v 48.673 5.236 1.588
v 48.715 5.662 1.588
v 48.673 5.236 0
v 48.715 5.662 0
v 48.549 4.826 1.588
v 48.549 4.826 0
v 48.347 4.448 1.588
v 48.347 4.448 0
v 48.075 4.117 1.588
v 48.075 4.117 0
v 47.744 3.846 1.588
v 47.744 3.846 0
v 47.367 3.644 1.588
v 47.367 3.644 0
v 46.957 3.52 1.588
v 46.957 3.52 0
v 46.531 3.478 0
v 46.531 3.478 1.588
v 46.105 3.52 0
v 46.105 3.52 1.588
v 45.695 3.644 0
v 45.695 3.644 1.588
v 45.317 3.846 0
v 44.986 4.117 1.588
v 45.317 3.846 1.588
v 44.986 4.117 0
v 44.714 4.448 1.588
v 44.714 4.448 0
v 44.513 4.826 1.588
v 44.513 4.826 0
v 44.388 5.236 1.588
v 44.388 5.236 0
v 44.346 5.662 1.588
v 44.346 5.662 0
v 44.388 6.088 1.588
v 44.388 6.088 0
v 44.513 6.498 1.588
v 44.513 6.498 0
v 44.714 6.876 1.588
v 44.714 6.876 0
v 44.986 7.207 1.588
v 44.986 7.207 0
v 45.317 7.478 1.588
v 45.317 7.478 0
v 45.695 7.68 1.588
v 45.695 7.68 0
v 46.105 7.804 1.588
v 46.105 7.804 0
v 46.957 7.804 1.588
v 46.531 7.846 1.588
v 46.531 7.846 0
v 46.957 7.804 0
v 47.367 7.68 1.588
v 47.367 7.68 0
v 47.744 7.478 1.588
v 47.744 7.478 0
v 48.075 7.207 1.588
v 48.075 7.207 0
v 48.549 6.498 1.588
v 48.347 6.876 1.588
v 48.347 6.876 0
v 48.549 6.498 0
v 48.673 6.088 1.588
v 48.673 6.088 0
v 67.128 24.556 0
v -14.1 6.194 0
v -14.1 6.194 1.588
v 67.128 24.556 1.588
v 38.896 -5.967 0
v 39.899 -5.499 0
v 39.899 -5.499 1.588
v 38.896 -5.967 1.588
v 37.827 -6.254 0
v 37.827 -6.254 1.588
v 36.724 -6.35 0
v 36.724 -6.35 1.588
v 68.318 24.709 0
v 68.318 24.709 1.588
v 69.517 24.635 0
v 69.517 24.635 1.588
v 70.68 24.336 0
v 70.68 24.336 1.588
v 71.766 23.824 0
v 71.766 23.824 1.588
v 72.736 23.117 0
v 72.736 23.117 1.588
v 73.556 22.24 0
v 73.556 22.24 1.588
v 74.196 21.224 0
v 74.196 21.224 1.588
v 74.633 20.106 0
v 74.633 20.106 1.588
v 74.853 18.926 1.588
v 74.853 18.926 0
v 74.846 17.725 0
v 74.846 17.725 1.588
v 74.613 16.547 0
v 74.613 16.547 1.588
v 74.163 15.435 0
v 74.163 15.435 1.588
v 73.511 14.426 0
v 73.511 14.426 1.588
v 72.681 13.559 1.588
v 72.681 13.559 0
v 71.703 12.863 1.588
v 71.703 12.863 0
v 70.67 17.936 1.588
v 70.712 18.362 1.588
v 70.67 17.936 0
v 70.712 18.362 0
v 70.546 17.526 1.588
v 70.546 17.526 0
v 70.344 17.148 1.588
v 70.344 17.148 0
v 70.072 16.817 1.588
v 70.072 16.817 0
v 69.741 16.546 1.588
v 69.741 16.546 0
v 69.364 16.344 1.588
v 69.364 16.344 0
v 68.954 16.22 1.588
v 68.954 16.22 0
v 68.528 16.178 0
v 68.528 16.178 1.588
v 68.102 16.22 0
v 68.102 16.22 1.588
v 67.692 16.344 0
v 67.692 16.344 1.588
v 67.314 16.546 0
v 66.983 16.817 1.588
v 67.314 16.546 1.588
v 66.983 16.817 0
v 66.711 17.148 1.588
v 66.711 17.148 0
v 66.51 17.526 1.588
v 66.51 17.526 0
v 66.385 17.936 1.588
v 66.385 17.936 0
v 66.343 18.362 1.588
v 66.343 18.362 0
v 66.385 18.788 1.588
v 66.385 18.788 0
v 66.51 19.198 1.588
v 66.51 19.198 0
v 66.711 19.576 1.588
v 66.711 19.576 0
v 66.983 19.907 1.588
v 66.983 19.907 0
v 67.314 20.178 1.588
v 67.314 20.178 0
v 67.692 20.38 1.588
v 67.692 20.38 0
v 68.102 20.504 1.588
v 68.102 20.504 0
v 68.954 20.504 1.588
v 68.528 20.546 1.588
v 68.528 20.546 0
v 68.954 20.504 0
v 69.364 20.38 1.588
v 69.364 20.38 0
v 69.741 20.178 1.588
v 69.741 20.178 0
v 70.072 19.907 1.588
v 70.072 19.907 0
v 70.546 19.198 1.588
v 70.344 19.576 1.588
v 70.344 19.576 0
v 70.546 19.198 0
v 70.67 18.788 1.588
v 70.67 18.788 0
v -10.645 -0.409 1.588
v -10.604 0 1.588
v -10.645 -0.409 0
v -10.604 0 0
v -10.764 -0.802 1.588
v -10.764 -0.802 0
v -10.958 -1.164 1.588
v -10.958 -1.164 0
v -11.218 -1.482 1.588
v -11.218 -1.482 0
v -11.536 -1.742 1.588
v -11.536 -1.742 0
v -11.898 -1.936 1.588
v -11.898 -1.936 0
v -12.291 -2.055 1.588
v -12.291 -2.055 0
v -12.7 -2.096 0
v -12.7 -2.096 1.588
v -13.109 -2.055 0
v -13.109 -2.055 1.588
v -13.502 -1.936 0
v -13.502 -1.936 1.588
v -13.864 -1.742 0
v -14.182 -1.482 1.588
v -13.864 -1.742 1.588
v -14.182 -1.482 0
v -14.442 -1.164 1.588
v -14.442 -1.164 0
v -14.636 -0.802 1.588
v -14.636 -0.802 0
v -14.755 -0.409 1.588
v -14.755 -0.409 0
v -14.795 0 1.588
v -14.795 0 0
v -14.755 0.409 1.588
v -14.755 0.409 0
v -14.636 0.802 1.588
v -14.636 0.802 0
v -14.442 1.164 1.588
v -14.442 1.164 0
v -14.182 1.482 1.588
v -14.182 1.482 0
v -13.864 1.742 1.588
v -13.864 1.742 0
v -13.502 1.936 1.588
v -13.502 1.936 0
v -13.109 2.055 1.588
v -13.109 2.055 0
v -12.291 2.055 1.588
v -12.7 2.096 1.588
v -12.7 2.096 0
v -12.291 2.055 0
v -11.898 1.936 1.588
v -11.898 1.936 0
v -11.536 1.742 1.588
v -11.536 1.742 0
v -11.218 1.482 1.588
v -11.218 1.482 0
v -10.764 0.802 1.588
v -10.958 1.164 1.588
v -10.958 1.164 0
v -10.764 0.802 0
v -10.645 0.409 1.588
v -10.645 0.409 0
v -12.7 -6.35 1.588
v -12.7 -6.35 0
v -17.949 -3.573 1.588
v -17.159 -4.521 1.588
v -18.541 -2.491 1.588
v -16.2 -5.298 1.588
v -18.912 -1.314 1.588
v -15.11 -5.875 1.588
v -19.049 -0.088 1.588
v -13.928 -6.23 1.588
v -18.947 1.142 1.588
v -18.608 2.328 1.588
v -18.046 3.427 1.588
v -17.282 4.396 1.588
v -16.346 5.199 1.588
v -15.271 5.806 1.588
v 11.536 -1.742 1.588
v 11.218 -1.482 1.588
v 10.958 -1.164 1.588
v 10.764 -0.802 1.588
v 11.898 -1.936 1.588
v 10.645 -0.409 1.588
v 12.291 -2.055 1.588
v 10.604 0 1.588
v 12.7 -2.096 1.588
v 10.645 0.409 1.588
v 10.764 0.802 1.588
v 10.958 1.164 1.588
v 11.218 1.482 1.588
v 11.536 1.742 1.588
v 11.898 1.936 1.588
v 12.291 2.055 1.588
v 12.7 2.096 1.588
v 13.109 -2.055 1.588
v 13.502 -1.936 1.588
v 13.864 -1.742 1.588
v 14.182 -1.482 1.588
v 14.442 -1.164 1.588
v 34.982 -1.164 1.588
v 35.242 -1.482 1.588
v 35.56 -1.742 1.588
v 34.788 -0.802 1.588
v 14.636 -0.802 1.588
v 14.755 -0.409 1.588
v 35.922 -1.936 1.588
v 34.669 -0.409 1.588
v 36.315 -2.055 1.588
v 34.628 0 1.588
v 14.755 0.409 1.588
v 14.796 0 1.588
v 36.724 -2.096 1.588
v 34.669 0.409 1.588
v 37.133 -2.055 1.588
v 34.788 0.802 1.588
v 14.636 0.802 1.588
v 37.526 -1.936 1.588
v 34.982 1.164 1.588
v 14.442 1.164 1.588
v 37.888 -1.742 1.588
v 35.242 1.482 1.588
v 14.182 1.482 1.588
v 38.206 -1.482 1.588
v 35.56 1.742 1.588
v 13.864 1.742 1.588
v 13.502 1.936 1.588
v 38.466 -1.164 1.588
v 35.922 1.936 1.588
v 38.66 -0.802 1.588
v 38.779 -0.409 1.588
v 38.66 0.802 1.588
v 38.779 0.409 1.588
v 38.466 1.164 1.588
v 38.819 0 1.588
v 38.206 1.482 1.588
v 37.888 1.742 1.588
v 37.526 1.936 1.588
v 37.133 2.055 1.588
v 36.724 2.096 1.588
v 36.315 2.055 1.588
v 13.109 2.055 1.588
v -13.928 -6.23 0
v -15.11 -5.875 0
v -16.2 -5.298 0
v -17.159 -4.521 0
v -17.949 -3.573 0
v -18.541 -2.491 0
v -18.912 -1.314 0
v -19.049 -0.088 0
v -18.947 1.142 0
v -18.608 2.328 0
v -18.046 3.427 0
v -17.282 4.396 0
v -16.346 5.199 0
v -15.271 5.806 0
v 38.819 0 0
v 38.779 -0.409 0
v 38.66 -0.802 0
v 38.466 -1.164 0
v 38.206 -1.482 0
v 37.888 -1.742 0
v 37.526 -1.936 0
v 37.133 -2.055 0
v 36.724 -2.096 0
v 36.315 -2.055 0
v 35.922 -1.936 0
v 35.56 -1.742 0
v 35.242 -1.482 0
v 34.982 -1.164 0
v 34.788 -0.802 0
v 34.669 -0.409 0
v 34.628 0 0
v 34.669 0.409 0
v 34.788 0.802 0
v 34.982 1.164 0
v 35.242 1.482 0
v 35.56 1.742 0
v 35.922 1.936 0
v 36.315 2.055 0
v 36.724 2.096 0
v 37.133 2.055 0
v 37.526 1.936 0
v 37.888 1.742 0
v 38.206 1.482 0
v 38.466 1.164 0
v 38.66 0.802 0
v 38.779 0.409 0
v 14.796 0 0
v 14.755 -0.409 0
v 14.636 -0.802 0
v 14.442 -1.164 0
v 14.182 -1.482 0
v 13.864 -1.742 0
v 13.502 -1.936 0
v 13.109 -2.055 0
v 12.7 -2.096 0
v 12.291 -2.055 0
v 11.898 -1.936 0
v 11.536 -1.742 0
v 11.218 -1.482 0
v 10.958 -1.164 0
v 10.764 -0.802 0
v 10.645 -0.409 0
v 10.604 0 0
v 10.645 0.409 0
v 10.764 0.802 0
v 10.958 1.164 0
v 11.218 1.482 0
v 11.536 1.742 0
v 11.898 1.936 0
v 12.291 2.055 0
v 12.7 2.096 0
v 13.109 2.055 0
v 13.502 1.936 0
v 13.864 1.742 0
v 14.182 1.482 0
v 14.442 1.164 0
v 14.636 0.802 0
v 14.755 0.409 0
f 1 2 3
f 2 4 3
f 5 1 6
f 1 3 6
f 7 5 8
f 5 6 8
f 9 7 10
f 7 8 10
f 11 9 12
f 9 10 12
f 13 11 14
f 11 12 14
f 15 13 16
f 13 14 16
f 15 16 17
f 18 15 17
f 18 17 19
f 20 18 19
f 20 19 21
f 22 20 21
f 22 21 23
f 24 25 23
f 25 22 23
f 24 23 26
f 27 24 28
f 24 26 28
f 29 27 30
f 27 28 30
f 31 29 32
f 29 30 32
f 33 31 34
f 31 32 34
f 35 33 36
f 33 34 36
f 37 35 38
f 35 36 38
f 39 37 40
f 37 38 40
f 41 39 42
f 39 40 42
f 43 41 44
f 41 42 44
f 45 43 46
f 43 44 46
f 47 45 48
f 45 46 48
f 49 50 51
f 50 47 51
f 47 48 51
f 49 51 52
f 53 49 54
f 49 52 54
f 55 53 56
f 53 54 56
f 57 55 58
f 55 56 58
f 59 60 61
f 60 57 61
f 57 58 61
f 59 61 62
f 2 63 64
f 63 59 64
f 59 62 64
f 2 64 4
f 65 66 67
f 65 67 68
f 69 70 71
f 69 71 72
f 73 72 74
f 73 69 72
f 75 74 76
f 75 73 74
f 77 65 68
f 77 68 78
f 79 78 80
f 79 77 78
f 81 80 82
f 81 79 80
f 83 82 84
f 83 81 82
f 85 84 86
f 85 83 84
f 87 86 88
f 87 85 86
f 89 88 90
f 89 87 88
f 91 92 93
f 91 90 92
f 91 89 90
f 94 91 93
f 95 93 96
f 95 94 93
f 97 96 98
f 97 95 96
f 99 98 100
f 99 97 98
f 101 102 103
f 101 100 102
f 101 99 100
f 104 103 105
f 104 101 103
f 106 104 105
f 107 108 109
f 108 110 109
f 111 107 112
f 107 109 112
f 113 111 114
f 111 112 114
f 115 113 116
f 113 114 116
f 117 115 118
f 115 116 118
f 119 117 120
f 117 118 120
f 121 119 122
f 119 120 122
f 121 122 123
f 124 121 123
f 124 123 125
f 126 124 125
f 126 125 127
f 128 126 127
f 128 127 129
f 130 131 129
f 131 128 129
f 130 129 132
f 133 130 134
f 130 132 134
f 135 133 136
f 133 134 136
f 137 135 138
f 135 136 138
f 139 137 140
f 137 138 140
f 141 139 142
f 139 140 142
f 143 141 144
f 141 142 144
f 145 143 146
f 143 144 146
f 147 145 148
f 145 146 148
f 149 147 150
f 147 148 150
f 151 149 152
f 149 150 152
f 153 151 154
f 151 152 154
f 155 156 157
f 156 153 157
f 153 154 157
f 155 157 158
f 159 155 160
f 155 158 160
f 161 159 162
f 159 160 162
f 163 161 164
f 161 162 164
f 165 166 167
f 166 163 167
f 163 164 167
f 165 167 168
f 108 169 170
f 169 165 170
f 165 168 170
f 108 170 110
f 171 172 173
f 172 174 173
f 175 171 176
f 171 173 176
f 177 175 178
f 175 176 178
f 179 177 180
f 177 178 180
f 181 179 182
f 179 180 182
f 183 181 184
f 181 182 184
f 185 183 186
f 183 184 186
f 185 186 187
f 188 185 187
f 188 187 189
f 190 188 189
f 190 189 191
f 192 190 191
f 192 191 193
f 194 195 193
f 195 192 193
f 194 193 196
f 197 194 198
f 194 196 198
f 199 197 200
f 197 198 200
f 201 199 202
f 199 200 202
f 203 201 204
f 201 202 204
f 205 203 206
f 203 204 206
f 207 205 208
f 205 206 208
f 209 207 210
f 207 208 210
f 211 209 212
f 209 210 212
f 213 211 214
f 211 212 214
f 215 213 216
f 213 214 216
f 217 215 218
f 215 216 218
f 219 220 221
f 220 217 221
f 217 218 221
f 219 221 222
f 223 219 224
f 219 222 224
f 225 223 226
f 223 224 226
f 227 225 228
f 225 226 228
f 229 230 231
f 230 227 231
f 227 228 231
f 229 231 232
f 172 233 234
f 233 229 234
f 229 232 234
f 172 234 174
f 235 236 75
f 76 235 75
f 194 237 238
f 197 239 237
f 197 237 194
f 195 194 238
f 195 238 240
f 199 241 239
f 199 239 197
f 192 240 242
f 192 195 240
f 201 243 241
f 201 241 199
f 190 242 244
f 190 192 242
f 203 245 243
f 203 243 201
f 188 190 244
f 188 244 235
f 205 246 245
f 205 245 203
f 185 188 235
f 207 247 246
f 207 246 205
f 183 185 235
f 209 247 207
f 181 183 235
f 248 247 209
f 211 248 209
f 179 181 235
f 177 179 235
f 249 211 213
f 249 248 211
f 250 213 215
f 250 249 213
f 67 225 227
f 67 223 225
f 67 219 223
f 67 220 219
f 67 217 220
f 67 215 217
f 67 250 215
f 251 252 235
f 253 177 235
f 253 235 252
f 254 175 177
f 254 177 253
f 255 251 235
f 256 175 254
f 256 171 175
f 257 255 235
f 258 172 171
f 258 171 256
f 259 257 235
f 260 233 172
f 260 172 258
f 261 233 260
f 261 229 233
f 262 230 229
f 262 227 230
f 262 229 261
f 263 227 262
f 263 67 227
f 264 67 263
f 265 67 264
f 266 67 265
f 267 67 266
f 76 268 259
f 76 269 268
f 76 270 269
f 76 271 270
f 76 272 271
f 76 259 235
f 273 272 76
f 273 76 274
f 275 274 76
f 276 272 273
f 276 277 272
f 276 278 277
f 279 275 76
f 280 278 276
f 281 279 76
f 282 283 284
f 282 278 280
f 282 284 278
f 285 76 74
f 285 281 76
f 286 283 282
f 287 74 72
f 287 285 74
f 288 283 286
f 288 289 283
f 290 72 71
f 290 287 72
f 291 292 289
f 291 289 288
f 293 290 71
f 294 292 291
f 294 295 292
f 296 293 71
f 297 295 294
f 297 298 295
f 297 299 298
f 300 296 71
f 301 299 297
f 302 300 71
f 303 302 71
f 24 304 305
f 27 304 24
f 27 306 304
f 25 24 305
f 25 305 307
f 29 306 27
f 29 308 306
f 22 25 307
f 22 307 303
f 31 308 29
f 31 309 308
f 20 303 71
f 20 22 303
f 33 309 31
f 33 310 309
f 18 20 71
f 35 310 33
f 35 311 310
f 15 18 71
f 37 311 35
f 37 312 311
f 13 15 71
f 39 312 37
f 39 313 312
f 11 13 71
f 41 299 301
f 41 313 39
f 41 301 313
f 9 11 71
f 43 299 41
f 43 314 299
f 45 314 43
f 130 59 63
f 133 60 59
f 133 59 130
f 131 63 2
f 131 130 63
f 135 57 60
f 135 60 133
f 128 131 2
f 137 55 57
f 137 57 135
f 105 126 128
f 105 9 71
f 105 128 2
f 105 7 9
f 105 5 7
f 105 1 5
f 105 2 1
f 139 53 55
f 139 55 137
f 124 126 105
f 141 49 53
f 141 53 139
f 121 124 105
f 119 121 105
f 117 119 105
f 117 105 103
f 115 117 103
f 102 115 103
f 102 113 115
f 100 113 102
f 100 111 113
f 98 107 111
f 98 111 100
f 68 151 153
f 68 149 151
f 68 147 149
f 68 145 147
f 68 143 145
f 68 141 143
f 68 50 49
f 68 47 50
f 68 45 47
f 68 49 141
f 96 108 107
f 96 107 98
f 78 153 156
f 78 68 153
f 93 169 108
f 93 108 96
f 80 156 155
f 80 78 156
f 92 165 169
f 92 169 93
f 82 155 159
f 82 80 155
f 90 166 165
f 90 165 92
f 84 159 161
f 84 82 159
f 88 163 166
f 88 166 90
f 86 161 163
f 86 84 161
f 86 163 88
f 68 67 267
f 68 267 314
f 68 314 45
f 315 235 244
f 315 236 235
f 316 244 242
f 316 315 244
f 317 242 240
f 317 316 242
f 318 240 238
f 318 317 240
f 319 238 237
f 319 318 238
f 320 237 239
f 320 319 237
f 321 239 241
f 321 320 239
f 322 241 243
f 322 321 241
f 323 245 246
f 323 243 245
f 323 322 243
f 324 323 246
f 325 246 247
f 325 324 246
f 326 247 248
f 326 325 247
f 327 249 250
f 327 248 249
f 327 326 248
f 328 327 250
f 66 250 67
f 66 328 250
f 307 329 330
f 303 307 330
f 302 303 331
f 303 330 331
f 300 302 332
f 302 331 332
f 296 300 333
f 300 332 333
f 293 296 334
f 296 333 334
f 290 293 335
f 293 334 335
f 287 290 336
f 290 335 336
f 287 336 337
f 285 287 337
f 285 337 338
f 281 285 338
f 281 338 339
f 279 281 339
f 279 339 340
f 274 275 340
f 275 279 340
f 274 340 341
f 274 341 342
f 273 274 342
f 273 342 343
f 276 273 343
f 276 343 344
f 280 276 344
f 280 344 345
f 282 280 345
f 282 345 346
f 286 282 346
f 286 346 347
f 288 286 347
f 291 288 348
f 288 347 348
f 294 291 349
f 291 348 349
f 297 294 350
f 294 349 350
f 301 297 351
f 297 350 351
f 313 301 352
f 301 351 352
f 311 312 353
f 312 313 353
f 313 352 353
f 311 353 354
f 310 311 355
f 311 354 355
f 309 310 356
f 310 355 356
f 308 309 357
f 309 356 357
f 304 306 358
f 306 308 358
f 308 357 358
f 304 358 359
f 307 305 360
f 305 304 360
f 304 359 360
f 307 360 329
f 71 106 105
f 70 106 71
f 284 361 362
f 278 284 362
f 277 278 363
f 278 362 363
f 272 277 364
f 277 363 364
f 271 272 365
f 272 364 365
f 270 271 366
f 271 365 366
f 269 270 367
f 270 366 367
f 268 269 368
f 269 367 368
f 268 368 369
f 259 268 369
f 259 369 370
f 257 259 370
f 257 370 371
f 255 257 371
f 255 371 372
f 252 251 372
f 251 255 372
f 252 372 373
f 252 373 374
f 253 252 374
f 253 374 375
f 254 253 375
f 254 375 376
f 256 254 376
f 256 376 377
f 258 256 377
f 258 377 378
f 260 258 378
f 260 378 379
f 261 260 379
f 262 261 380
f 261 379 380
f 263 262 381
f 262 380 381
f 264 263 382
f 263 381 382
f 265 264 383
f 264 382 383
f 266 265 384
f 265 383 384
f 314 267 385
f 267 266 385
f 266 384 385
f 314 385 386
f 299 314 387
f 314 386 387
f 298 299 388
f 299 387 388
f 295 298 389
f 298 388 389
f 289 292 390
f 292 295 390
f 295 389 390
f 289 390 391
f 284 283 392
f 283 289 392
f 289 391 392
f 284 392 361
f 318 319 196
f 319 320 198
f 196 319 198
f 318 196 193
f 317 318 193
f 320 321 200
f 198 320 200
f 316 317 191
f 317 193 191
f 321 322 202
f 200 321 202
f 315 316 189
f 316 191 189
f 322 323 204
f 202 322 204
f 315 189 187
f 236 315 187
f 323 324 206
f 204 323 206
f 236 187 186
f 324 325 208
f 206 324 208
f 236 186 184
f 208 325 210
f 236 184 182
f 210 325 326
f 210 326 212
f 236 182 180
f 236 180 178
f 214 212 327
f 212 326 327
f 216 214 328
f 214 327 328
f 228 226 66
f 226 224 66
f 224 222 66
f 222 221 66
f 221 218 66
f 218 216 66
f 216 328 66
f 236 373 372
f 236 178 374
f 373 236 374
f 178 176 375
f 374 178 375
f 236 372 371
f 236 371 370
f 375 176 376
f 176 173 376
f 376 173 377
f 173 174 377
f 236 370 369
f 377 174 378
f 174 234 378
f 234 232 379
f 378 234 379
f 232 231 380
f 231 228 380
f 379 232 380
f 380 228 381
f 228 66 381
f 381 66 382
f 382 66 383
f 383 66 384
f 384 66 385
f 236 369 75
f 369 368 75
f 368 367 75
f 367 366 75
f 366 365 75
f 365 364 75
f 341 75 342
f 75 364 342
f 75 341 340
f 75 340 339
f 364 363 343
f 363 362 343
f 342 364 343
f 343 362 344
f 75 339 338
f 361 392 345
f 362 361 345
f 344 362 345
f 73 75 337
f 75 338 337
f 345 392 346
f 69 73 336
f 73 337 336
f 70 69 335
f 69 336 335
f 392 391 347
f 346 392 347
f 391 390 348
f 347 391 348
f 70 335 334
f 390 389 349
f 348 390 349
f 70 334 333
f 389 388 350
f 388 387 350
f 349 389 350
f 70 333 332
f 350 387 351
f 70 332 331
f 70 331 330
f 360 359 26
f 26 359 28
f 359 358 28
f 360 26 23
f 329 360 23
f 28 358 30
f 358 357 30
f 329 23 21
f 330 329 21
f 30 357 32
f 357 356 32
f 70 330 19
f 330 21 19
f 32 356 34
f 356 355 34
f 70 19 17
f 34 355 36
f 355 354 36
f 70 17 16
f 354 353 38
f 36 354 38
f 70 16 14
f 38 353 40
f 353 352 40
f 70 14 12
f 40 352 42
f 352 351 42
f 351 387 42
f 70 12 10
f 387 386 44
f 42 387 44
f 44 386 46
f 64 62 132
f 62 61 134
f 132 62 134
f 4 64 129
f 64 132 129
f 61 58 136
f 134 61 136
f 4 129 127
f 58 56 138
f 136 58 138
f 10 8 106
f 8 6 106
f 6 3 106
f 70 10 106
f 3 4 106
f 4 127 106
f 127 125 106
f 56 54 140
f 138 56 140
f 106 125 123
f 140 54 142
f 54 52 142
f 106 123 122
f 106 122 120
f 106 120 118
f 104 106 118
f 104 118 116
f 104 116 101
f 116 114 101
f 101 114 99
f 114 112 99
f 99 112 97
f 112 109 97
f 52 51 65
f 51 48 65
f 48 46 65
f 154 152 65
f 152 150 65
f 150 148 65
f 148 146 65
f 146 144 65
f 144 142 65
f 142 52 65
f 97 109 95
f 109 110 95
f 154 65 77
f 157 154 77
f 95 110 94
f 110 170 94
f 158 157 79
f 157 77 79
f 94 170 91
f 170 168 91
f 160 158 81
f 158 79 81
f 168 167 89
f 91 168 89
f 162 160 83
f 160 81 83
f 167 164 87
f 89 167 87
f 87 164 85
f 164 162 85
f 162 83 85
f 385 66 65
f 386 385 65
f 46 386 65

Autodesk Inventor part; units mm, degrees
ref_plane "YZ Plane" through (0, 0, 0) normal (1, 0, 0) x (0, 1, 0)
ref_plane "XZ Plane" through (0, 0, 0) normal (0, 1, 0) x (-1, 0, 0)
ref_plane "XY Plane" through (0, 0, 0) normal (0, 0, 1) x (1, 0, 0)
sketch "main" plane through (0, 0, 0) normal (0, 0, 1) x (1, 0, 0)
  circle A0 centre (15.0202, -6.3416) radius 2.1844
  circle A1 centre (37.0172, 6.3584) radius 2.1844
  arc A2 (40.1922, 0.8591) -> (33.8536, 11.8642) centre (37.0172, 6.3584) ccw
  line L0 (-44.2105, -18.3536) -> (5.2134, -18.3536)
  line L1 (40.1922, 0.8591) -> (8.3884, -17.5028)
  circle A3 centre (5.2134, -12.0036) radius 2.0955
  arc A4 (5.2134, -18.3536) -> (8.3884, -17.5028) centre (5.2134, -12.0036) ccw
  line L2 (5.2134, -12.0036) -> (43.3134, -12.0036) construction
  arc A5 (-45.6106, -5.8098) -> (-44.2105, -18.3536) centre (-44.2105, -12.0036) ccw
  line L3 (33.8536, 11.8642) -> (68.8891, 11.8642) construction
  line L4 (-45.6106, -5.8098) -> (35.6171, 12.5521)
  circle A6 centre (-18.8105, -12.0036) radius 2.0955
  circle A7 centre (-44.2105, -12.0036) radius 2.0955
  point P0 (-0.7926, -1.6009)
  dimension "d3" = 12.7
  dimension "d7" = 4.191
  dimension "d8" = 6.35
  dimension "d13" = 25.4
  dimension "d16" = 4.191
sketch "Sketch1" plane through (0, 0, 0) normal (0, 0, 1) x (1, 0, 0)
  circle A0 centre (46.5307, 5.662) radius 2.1844
  circle A1 centre (68.5277, 18.362) radius 2.1844
  arc A2 (71.7027, 12.8627) -> (65.3641, 23.8678) centre (68.5277, 18.362) ccw
  line L0 (-12.7, -6.35) -> (36.7239, -6.35)
  line L1 (71.7027, 12.8627) -> (39.8989, -5.4993)
  circle A3 centre (36.7239, 0) radius 2.0955
  arc A4 (36.7239, -6.35) -> (39.8989, -5.4993) centre (36.7239, 0) ccw
  line L2 (36.7239, 0) -> (74.8239, 0) construction
  arc A5 (-14.1001, 6.1937) -> (-12.7, -6.35) centre (-12.7, 0) ccw
  line L3 (65.3641, 23.8678) -> (100.3996, 23.8678) construction
  line L4 (-14.1001, 6.1937) -> (67.1276, 24.5557)
  circle A6 centre (12.7, 0) radius 2.0955
  circle A7 centre (-12.7, 0) radius 2.0955
  point P0 (0, 0)
extrude "Extrusion1" add sketch "Sketch1" along normal blind 1.5875
equation "\"BendRadius\" = Thickness"
equation "\"BendReliefWidth\" = Thickness"
equation "\"BendReliefDepth\" = 0.5 * Thickness"
equation "\"CornerReliefSize\" = 4 * Thickness"
equation "\"MinimumRemnant\" = 2 * Thickness"
equation "\"TransitionRadius\" = BendRadius"
equation "\"JacobiRadiusSize\" = BendRadius"
equation "\"GapSize\" = Thickness"
equation "\"Thickness\" = 1.5875"
properties part number "60 Degree Gusset" material "Acetal Resin, White"
